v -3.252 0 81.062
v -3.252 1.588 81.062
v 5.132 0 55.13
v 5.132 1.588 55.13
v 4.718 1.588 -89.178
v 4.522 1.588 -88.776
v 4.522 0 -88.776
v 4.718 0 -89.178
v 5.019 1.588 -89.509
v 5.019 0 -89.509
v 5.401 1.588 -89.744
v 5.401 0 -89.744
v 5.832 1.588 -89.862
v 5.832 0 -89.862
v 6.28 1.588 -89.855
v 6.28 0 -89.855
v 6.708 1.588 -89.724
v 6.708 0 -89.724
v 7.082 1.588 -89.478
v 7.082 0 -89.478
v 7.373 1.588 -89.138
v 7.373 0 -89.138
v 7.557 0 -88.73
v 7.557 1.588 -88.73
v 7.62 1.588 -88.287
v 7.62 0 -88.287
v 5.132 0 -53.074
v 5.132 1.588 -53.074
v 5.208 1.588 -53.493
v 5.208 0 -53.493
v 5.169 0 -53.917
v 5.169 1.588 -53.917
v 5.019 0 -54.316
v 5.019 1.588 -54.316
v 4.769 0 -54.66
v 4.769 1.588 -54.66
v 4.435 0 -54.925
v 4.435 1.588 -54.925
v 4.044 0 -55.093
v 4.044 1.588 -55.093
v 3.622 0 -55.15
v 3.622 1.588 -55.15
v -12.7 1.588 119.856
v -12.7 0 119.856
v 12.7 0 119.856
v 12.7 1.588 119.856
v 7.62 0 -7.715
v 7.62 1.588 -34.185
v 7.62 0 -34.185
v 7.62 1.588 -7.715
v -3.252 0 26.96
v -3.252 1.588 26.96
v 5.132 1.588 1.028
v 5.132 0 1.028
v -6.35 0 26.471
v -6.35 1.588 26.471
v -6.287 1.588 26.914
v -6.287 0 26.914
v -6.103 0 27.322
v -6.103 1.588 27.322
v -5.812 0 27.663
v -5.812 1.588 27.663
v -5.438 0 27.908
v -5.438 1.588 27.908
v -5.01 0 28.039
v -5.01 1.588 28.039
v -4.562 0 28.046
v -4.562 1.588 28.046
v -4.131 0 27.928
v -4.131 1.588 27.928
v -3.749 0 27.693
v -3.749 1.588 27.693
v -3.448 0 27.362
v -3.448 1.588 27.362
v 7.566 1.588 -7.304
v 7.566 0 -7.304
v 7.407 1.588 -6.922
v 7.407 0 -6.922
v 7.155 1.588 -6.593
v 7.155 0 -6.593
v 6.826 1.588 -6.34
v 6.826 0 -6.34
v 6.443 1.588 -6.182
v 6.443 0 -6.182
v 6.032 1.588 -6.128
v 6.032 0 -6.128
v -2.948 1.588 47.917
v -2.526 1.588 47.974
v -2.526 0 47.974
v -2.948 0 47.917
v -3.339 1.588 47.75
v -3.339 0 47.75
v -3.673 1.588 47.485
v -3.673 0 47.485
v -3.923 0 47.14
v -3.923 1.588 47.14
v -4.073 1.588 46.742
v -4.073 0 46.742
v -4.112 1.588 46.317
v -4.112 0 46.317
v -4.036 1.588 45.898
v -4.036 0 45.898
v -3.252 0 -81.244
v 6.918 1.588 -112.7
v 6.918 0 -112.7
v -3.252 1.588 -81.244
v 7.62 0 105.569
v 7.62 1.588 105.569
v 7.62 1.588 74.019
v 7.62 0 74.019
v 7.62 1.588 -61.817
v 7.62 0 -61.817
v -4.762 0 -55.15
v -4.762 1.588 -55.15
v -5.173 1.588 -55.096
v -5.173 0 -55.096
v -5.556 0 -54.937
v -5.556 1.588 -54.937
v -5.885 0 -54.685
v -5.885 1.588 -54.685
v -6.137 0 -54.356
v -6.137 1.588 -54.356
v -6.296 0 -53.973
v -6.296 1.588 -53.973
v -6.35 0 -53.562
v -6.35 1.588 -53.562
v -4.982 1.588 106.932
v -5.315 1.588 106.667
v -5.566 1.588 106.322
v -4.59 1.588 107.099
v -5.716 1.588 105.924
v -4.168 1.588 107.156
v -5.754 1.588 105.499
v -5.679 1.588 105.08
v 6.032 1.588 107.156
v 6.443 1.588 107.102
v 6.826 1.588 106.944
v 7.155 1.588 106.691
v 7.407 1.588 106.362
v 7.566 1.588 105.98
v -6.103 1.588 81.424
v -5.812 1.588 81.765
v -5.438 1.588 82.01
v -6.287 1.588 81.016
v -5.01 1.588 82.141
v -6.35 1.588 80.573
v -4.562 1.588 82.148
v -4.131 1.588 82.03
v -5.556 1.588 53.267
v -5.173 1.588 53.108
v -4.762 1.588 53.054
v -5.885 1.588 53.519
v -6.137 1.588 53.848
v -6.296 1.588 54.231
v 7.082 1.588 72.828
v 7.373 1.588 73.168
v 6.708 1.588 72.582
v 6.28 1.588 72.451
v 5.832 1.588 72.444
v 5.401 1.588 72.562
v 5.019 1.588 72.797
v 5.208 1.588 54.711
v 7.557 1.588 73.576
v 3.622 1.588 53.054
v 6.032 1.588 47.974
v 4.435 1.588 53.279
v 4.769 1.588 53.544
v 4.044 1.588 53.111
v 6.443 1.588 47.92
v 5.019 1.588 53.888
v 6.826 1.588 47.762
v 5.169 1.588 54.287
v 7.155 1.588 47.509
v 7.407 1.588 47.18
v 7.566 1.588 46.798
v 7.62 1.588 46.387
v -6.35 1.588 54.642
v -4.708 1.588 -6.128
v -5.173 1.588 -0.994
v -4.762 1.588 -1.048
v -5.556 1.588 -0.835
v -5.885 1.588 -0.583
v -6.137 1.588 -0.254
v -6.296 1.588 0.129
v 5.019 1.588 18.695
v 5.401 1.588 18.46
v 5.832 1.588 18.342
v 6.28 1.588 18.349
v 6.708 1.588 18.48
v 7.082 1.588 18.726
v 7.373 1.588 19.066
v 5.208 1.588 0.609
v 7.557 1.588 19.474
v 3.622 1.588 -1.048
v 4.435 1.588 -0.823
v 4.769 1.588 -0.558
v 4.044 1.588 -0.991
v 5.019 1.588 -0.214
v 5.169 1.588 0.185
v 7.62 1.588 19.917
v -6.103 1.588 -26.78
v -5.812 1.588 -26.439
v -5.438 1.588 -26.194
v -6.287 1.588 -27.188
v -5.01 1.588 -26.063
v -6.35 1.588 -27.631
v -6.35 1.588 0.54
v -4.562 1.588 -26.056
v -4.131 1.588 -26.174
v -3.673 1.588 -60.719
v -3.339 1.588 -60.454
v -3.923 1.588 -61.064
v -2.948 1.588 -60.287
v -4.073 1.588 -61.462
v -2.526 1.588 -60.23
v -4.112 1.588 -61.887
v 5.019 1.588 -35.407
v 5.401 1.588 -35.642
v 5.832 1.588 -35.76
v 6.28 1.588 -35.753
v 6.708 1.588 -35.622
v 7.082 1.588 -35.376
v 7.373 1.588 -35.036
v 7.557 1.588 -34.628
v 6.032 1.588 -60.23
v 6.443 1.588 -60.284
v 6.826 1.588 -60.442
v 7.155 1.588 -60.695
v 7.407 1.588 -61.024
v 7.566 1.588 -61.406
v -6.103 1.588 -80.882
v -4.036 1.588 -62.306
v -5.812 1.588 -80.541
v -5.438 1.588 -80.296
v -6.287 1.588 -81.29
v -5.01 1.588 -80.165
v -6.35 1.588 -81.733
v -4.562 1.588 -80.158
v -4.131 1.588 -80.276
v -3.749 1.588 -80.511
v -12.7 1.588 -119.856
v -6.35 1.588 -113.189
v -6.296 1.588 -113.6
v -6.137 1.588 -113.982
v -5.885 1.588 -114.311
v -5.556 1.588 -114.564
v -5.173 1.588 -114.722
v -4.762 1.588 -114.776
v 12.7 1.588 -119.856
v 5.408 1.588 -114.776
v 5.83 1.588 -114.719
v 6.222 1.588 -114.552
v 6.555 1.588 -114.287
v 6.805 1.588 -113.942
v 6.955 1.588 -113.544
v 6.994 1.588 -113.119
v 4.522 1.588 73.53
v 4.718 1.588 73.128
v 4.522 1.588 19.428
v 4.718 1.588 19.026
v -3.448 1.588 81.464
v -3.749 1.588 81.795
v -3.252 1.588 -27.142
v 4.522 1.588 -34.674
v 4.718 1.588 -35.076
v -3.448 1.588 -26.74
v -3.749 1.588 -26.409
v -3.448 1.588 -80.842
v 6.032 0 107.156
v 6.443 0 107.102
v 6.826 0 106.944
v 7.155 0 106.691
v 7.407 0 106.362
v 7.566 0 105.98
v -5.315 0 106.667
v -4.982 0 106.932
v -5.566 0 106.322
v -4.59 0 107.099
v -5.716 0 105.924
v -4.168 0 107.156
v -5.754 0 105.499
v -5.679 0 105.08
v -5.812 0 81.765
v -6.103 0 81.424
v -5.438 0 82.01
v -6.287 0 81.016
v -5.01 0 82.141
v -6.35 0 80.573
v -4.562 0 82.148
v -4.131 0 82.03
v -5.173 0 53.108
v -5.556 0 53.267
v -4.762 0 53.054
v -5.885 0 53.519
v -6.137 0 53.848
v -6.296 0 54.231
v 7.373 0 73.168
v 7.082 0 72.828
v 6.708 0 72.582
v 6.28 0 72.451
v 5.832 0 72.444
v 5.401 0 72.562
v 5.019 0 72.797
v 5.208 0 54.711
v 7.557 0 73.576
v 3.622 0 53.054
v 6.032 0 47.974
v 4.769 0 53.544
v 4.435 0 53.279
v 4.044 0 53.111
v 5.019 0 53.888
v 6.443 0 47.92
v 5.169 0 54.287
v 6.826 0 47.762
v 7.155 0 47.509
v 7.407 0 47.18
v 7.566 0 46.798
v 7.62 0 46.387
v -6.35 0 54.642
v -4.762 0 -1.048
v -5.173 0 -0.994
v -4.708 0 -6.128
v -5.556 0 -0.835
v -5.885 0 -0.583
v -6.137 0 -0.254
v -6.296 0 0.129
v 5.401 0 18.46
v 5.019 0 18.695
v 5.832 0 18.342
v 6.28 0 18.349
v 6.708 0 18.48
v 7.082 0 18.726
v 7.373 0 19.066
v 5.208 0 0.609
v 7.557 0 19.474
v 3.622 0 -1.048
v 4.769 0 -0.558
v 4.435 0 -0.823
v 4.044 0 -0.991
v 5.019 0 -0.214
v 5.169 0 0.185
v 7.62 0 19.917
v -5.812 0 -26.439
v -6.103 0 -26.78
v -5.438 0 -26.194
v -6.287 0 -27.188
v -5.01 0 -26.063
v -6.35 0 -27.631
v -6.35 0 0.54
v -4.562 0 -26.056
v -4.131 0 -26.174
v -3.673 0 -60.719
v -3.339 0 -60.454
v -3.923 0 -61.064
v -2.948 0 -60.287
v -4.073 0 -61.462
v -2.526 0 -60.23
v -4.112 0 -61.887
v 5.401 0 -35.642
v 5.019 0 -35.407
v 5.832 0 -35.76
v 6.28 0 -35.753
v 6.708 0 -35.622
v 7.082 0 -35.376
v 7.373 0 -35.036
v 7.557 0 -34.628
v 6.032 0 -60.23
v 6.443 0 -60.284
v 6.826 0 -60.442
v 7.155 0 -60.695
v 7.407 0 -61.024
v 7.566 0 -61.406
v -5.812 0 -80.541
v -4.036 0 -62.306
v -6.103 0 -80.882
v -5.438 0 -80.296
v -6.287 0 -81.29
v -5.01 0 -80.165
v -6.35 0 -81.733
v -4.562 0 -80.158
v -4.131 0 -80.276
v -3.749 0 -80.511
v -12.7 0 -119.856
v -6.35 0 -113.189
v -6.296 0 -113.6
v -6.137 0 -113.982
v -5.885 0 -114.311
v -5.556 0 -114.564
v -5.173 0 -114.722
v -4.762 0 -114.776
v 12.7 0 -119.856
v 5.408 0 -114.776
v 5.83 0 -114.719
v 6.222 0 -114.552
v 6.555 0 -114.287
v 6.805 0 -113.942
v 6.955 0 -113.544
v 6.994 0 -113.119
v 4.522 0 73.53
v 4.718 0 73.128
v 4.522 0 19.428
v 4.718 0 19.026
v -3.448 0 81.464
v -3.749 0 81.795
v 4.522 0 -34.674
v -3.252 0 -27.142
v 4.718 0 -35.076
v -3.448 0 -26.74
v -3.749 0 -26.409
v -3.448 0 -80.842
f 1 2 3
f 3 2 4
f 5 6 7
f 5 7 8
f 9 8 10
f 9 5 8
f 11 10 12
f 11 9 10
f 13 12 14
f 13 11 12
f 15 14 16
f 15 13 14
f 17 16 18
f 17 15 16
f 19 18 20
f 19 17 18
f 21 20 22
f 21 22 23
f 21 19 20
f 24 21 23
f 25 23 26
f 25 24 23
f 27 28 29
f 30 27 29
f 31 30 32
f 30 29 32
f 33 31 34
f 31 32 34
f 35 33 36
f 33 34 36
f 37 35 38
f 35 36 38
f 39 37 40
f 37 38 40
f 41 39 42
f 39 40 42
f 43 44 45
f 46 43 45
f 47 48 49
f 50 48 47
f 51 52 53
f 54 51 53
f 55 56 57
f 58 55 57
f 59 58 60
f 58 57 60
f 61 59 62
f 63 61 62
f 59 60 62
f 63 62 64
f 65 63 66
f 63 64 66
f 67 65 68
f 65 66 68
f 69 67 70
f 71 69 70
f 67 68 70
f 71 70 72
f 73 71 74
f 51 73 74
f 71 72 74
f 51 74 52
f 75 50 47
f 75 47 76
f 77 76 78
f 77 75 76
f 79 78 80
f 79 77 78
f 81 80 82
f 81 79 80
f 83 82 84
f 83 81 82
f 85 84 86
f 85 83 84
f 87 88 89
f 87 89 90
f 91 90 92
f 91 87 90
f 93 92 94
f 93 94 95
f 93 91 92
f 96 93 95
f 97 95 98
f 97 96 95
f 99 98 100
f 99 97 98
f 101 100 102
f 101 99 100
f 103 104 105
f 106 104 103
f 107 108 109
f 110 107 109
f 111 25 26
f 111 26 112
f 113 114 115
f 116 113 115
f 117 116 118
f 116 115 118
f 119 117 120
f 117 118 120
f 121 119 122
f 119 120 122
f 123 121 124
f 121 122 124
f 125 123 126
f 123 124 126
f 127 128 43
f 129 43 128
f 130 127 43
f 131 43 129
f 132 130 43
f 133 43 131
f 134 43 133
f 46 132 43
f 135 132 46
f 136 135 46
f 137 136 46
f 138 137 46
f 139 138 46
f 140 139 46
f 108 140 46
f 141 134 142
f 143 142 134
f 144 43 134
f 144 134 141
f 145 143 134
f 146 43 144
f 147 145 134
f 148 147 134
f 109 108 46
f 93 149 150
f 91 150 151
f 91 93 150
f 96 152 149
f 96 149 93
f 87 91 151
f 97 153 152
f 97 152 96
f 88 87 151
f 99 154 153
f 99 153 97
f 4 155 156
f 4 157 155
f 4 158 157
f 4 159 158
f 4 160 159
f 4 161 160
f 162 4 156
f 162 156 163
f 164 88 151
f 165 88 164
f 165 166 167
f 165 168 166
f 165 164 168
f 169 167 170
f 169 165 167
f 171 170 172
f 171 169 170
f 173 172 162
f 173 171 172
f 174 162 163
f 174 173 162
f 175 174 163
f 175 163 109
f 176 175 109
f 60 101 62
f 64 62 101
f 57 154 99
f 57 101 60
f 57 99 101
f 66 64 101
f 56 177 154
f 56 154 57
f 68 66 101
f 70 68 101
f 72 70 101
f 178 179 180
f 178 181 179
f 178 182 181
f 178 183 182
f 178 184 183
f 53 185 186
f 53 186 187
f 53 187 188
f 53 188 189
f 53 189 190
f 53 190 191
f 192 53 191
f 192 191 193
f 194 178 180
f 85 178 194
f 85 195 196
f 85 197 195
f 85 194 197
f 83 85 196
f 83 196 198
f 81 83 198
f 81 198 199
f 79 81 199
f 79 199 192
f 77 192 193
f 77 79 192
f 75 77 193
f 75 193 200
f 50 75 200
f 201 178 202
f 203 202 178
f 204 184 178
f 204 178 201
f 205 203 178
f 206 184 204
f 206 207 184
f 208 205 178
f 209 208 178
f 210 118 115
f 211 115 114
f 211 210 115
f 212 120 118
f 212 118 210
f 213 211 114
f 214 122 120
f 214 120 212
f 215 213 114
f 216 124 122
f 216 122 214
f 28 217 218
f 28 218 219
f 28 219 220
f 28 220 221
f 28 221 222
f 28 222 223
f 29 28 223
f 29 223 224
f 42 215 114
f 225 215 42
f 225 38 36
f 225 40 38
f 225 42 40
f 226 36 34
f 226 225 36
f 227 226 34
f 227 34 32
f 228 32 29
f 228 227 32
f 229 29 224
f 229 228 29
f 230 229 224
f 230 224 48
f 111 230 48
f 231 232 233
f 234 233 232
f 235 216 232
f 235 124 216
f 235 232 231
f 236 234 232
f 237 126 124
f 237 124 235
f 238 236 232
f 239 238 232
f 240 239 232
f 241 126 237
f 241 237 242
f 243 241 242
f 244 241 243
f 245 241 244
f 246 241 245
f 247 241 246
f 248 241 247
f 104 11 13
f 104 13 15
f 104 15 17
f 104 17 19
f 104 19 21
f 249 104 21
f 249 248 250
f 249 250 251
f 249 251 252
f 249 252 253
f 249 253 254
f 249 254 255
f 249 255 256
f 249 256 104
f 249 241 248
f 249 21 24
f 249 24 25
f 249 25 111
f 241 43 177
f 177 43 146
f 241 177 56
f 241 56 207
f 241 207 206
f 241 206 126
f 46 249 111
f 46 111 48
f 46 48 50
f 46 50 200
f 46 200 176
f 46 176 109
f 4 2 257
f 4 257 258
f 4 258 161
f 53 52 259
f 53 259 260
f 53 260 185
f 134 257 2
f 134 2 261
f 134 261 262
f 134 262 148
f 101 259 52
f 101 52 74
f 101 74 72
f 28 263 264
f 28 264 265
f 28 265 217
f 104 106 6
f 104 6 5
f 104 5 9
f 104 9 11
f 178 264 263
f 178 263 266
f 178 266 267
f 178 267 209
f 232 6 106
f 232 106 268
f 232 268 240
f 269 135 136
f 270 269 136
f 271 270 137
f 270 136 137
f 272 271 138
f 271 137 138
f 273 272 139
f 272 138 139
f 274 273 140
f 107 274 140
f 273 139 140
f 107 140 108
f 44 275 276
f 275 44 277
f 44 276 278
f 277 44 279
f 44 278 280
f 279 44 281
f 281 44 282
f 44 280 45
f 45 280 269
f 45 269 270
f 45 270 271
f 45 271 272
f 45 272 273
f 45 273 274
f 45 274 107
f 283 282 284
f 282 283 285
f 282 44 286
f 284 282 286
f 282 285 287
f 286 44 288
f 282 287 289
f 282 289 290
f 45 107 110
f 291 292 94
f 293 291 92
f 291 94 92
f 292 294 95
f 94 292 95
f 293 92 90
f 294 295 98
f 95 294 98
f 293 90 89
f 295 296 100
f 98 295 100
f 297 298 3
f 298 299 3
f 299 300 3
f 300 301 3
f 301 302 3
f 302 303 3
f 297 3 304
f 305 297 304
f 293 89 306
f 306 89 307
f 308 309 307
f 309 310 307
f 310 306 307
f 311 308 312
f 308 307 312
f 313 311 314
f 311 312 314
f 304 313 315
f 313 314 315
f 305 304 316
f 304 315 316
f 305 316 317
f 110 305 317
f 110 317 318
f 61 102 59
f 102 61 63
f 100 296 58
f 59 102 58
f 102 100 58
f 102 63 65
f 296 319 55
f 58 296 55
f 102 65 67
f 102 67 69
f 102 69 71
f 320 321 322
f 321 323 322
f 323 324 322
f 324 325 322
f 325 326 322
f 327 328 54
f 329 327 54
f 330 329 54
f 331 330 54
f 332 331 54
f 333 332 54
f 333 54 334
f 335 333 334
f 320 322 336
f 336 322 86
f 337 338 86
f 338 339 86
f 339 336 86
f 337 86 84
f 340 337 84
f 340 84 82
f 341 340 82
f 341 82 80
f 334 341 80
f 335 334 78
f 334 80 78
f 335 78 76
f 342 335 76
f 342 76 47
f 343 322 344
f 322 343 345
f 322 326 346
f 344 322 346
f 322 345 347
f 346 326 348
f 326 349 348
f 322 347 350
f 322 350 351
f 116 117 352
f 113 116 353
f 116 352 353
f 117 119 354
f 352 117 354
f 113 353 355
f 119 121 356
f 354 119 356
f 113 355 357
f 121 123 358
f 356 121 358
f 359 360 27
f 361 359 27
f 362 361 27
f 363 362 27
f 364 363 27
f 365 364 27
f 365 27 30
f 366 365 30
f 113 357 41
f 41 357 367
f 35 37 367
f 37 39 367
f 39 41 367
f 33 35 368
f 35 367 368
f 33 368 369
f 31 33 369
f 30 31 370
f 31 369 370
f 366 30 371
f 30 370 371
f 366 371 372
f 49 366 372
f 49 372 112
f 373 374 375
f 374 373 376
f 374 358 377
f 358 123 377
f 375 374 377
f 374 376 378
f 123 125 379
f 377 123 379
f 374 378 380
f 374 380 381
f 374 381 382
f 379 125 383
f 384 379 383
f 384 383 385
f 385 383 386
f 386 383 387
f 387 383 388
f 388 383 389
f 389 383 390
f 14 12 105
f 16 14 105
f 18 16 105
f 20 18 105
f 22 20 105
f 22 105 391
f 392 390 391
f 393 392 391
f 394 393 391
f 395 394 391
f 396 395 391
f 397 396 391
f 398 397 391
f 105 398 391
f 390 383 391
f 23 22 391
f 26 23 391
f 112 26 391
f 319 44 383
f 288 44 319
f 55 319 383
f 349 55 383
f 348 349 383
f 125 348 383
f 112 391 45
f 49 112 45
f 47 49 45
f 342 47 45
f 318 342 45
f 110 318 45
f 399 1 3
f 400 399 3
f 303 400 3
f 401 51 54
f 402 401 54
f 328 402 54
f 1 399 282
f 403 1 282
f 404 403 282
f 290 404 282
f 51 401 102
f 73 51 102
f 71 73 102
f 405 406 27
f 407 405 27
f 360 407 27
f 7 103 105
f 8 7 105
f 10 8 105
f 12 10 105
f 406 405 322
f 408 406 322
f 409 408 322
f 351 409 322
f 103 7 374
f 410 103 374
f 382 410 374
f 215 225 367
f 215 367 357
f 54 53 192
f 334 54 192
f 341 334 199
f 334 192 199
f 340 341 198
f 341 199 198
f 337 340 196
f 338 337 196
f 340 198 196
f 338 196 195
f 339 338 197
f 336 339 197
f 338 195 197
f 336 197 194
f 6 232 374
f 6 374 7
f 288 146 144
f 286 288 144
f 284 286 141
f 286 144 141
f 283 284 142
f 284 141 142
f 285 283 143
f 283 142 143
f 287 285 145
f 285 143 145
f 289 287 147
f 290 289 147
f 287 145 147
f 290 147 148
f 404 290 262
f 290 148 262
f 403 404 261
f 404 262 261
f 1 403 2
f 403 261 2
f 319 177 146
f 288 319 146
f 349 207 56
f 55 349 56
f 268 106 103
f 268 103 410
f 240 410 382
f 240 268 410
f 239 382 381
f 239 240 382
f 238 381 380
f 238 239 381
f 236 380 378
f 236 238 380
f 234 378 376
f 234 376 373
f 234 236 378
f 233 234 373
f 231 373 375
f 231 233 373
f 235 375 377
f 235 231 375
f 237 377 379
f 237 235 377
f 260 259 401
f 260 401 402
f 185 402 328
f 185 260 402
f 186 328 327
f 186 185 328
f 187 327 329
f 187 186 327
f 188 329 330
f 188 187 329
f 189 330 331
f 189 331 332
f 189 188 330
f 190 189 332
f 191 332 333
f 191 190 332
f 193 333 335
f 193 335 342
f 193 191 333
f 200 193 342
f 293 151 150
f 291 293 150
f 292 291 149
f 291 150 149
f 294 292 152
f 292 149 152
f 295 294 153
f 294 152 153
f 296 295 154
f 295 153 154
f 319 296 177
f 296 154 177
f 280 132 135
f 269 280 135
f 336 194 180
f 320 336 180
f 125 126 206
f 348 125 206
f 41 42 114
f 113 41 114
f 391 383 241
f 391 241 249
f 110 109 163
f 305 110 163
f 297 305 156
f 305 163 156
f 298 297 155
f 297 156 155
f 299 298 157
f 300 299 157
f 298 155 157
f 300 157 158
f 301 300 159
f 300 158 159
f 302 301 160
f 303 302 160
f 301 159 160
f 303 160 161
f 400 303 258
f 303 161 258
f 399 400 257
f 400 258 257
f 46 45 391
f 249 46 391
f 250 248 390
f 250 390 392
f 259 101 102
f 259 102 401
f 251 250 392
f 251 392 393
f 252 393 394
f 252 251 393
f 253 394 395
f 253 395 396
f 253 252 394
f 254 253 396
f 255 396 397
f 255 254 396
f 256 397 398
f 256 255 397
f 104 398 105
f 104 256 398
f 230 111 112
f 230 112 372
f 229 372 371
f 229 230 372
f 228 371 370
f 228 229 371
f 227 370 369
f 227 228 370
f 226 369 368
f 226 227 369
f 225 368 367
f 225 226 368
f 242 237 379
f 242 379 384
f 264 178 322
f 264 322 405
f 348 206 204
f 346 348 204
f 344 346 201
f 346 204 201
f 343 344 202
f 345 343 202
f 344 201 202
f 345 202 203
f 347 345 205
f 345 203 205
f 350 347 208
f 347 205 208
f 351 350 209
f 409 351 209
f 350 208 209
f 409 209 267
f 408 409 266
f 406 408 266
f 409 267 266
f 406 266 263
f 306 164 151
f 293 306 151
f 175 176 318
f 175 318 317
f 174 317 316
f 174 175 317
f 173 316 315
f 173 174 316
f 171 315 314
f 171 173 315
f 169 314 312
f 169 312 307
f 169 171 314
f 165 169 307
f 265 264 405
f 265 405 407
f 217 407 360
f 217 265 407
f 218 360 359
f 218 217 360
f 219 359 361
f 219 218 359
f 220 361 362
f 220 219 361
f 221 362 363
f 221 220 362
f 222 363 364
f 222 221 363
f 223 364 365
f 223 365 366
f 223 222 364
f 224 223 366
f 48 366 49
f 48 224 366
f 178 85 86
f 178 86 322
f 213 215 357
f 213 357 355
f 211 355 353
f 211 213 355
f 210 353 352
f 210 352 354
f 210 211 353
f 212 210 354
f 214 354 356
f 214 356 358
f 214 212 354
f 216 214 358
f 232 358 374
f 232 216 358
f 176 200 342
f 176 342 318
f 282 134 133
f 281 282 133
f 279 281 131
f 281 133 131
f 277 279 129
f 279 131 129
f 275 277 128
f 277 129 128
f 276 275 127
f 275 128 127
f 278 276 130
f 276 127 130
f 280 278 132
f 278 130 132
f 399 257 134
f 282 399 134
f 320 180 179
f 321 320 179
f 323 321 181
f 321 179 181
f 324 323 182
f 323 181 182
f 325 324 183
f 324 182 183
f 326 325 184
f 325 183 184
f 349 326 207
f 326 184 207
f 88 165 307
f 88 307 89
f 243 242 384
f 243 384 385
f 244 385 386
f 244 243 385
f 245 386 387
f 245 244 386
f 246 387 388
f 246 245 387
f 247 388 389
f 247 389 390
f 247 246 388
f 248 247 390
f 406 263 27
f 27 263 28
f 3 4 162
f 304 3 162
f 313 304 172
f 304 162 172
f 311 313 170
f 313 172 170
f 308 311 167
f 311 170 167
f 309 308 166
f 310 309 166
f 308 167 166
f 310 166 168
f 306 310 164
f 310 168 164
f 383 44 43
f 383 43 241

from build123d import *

# Parameters (mm, degrees)
SKETCH1_W           = 25.4
SKETCH1_H           = 239.7125
BOSS_EXTRUDE1_DEPTH = 1.5875
CUT_EXTRUDE1_DEPTH  = 1.5875


with BuildPart() as part:
    # Sketch1 → Boss-Extrude1 (new body)
    with BuildSketch(Plane(origin=(0, 0, 0), x_dir=(1, 0, 0), z_dir=(0, 1, 0))):
        Rectangle(SKETCH1_W, SKETCH1_H)
    extrude(amount=BOSS_EXTRUDE1_DEPTH)

    # Sketch2 → Cut-Extrude1 (cut)
    with BuildSketch(Plane(origin=(0, 1.5875, 0), x_dir=(1, 0, 0), z_dir=(0, 1, 0))):
        with BuildLine():
            Line((-4.168311679, -107.15625), (6.0325, -107.15625))
            ThreePointArc((6.0325, -107.15625), (7.155032015, -106.691282015), (7.62, -105.56875))
            Line((7.62, -105.56875), (7.62, -74.018760533))
            ThreePointArc((7.62, -74.018760533), (6.279706302, -72.450626198), (4.521990181, -73.530379191))
            Line((4.521990181, -73.530379191), (-5.678821499, -105.080368658))
            ThreePointArc((-5.678821499, -105.080368658), (-5.451951355, -106.50278717), (-4.168311679, -107.15625))
        make_face()
        with BuildLine():
            Line((-4.7625, 114.77625), (5.407956322, 114.77625))
            ThreePointArc((5.407956322, 114.77625), (6.691595997, 114.12278717), (6.918466141, 112.700368658))
            Line((6.918466141, 112.700368658), (-3.251990181, 81.244264977))
            ThreePointArc((-3.251990181, 81.244264977), (-5.009706302, 80.164511984), (-6.35, 81.732646319))
            Line((-6.35, 81.732646319), (-6.35, 113.18875))
            ThreePointArc((-6.35, 113.18875), (-5.885032015, 114.311282015), (-4.7625, 114.77625))
        make_face()
        with BuildLine():
            Line((7.62, 88.287239467), (7.62, 61.81725))
            ThreePointArc((7.62, 61.81725), (7.155032015, 60.694717985), (6.0325, 60.22975))
            Line((6.0325, 60.22975), (-2.525834956, 60.22975))
            ThreePointArc((-2.525834956, 60.22975), (-3.809474631, 60.88321283), (-4.036344775, 62.305631342))
            Line((-4.036344775, 62.305631342), (4.521990181, 88.775620809))
            ThreePointArc((4.521990181, 88.775620809), (6.279706302, 89.855373802), (7.62, 88.287239467))
        make_face()
        with BuildLine():
            Line((-3.251990181, -81.061735023), (5.132272704, -55.130131342))
            ThreePointArc((5.132272704, -55.130131342), (4.90540256, -53.70771283), (3.621762885, -53.05425))
            Line((3.621762885, -53.05425), (-4.7625, -53.05425))
            ThreePointArc((-4.7625, -53.05425), (-5.885032015, -53.519217985), (-6.35, -54.64175))
            Line((-6.35, -54.64175), (-6.35, -80.573353681))
            ThreePointArc((-6.35, -80.573353681), (-5.009706302, -82.141488016), (-3.251990181, -81.061735023))
        make_face()
        with BuildLine():
            Line((-3.251990181, -26.959735023), (5.132272704, -1.028131342))
            ThreePointArc((5.132272704, -1.028131342), (4.90540256, 0.39428717), (3.621762885, 1.04775))
            Line((3.621762885, 1.04775), (-4.7625, 1.04775))
            ThreePointArc((-4.7625, 1.04775), (-5.885032015, 0.582782015), (-6.35, -0.53975))
            Line((-6.35, -0.53975), (-6.35, -26.471353681))
            ThreePointArc((-6.35, -26.471353681), (-5.009706302, -28.039488016), (-3.251990181, -26.959735023))
        make_face()
        with BuildLine():
            Line((-4.036344775, -45.898368658), (4.521990181, -19.428379191))
            ThreePointArc((4.521990181, -19.428379191), (6.279706302, -18.348626198), (7.62, -19.916760533))
            Line((7.62, -19.916760533), (7.62, -46.38675))
            ThreePointArc((7.62, -46.38675), (7.155032015, -47.509282015), (6.0325, -47.97425))
            Line((6.0325, -47.97425), (-2.525834956, -47.97425))
            ThreePointArc((-2.525834956, -47.97425), (-3.809474631, -47.32078717), (-4.036344775, -45.898368658))
        make_face()
        with BuildLine():
            Line((-3.251990181, 27.142264977), (5.132272704, 53.073868658))
            ThreePointArc((5.132272704, 53.073868658), (4.90540256, 54.49628717), (3.621762885, 55.14975))
            Line((3.621762885, 55.14975), (-4.7625, 55.14975))
            ThreePointArc((-4.7625, 55.14975), (-5.885032015, 54.684782015), (-6.35, 53.56225))
            Line((-6.35, 53.56225), (-6.35, 27.630646319))
            ThreePointArc((-6.35, 27.630646319), (-5.009706302, 26.062511984), (-3.251990181, 27.142264977))
        make_face()
        with BuildLine():
            Line((-4.707523276, 6.12775), (4.521990181, 34.673620809))
            ThreePointArc((4.521990181, 34.673620809), (6.279706302, 35.753373802), (7.62, 34.185239467))
            Line((7.62, 34.185239467), (7.62, 7.71525))
            ThreePointArc((7.62, 7.71525), (7.155032015, 6.592717985), (6.0325, 6.12775))
            Line((6.0325, 6.12775), (-4.707523276, 6.12775))
        make_face()
    extrude(amount=-CUT_EXTRUDE1_DEPTH, mode=Mode.SUBTRACT)


solid = part.part
